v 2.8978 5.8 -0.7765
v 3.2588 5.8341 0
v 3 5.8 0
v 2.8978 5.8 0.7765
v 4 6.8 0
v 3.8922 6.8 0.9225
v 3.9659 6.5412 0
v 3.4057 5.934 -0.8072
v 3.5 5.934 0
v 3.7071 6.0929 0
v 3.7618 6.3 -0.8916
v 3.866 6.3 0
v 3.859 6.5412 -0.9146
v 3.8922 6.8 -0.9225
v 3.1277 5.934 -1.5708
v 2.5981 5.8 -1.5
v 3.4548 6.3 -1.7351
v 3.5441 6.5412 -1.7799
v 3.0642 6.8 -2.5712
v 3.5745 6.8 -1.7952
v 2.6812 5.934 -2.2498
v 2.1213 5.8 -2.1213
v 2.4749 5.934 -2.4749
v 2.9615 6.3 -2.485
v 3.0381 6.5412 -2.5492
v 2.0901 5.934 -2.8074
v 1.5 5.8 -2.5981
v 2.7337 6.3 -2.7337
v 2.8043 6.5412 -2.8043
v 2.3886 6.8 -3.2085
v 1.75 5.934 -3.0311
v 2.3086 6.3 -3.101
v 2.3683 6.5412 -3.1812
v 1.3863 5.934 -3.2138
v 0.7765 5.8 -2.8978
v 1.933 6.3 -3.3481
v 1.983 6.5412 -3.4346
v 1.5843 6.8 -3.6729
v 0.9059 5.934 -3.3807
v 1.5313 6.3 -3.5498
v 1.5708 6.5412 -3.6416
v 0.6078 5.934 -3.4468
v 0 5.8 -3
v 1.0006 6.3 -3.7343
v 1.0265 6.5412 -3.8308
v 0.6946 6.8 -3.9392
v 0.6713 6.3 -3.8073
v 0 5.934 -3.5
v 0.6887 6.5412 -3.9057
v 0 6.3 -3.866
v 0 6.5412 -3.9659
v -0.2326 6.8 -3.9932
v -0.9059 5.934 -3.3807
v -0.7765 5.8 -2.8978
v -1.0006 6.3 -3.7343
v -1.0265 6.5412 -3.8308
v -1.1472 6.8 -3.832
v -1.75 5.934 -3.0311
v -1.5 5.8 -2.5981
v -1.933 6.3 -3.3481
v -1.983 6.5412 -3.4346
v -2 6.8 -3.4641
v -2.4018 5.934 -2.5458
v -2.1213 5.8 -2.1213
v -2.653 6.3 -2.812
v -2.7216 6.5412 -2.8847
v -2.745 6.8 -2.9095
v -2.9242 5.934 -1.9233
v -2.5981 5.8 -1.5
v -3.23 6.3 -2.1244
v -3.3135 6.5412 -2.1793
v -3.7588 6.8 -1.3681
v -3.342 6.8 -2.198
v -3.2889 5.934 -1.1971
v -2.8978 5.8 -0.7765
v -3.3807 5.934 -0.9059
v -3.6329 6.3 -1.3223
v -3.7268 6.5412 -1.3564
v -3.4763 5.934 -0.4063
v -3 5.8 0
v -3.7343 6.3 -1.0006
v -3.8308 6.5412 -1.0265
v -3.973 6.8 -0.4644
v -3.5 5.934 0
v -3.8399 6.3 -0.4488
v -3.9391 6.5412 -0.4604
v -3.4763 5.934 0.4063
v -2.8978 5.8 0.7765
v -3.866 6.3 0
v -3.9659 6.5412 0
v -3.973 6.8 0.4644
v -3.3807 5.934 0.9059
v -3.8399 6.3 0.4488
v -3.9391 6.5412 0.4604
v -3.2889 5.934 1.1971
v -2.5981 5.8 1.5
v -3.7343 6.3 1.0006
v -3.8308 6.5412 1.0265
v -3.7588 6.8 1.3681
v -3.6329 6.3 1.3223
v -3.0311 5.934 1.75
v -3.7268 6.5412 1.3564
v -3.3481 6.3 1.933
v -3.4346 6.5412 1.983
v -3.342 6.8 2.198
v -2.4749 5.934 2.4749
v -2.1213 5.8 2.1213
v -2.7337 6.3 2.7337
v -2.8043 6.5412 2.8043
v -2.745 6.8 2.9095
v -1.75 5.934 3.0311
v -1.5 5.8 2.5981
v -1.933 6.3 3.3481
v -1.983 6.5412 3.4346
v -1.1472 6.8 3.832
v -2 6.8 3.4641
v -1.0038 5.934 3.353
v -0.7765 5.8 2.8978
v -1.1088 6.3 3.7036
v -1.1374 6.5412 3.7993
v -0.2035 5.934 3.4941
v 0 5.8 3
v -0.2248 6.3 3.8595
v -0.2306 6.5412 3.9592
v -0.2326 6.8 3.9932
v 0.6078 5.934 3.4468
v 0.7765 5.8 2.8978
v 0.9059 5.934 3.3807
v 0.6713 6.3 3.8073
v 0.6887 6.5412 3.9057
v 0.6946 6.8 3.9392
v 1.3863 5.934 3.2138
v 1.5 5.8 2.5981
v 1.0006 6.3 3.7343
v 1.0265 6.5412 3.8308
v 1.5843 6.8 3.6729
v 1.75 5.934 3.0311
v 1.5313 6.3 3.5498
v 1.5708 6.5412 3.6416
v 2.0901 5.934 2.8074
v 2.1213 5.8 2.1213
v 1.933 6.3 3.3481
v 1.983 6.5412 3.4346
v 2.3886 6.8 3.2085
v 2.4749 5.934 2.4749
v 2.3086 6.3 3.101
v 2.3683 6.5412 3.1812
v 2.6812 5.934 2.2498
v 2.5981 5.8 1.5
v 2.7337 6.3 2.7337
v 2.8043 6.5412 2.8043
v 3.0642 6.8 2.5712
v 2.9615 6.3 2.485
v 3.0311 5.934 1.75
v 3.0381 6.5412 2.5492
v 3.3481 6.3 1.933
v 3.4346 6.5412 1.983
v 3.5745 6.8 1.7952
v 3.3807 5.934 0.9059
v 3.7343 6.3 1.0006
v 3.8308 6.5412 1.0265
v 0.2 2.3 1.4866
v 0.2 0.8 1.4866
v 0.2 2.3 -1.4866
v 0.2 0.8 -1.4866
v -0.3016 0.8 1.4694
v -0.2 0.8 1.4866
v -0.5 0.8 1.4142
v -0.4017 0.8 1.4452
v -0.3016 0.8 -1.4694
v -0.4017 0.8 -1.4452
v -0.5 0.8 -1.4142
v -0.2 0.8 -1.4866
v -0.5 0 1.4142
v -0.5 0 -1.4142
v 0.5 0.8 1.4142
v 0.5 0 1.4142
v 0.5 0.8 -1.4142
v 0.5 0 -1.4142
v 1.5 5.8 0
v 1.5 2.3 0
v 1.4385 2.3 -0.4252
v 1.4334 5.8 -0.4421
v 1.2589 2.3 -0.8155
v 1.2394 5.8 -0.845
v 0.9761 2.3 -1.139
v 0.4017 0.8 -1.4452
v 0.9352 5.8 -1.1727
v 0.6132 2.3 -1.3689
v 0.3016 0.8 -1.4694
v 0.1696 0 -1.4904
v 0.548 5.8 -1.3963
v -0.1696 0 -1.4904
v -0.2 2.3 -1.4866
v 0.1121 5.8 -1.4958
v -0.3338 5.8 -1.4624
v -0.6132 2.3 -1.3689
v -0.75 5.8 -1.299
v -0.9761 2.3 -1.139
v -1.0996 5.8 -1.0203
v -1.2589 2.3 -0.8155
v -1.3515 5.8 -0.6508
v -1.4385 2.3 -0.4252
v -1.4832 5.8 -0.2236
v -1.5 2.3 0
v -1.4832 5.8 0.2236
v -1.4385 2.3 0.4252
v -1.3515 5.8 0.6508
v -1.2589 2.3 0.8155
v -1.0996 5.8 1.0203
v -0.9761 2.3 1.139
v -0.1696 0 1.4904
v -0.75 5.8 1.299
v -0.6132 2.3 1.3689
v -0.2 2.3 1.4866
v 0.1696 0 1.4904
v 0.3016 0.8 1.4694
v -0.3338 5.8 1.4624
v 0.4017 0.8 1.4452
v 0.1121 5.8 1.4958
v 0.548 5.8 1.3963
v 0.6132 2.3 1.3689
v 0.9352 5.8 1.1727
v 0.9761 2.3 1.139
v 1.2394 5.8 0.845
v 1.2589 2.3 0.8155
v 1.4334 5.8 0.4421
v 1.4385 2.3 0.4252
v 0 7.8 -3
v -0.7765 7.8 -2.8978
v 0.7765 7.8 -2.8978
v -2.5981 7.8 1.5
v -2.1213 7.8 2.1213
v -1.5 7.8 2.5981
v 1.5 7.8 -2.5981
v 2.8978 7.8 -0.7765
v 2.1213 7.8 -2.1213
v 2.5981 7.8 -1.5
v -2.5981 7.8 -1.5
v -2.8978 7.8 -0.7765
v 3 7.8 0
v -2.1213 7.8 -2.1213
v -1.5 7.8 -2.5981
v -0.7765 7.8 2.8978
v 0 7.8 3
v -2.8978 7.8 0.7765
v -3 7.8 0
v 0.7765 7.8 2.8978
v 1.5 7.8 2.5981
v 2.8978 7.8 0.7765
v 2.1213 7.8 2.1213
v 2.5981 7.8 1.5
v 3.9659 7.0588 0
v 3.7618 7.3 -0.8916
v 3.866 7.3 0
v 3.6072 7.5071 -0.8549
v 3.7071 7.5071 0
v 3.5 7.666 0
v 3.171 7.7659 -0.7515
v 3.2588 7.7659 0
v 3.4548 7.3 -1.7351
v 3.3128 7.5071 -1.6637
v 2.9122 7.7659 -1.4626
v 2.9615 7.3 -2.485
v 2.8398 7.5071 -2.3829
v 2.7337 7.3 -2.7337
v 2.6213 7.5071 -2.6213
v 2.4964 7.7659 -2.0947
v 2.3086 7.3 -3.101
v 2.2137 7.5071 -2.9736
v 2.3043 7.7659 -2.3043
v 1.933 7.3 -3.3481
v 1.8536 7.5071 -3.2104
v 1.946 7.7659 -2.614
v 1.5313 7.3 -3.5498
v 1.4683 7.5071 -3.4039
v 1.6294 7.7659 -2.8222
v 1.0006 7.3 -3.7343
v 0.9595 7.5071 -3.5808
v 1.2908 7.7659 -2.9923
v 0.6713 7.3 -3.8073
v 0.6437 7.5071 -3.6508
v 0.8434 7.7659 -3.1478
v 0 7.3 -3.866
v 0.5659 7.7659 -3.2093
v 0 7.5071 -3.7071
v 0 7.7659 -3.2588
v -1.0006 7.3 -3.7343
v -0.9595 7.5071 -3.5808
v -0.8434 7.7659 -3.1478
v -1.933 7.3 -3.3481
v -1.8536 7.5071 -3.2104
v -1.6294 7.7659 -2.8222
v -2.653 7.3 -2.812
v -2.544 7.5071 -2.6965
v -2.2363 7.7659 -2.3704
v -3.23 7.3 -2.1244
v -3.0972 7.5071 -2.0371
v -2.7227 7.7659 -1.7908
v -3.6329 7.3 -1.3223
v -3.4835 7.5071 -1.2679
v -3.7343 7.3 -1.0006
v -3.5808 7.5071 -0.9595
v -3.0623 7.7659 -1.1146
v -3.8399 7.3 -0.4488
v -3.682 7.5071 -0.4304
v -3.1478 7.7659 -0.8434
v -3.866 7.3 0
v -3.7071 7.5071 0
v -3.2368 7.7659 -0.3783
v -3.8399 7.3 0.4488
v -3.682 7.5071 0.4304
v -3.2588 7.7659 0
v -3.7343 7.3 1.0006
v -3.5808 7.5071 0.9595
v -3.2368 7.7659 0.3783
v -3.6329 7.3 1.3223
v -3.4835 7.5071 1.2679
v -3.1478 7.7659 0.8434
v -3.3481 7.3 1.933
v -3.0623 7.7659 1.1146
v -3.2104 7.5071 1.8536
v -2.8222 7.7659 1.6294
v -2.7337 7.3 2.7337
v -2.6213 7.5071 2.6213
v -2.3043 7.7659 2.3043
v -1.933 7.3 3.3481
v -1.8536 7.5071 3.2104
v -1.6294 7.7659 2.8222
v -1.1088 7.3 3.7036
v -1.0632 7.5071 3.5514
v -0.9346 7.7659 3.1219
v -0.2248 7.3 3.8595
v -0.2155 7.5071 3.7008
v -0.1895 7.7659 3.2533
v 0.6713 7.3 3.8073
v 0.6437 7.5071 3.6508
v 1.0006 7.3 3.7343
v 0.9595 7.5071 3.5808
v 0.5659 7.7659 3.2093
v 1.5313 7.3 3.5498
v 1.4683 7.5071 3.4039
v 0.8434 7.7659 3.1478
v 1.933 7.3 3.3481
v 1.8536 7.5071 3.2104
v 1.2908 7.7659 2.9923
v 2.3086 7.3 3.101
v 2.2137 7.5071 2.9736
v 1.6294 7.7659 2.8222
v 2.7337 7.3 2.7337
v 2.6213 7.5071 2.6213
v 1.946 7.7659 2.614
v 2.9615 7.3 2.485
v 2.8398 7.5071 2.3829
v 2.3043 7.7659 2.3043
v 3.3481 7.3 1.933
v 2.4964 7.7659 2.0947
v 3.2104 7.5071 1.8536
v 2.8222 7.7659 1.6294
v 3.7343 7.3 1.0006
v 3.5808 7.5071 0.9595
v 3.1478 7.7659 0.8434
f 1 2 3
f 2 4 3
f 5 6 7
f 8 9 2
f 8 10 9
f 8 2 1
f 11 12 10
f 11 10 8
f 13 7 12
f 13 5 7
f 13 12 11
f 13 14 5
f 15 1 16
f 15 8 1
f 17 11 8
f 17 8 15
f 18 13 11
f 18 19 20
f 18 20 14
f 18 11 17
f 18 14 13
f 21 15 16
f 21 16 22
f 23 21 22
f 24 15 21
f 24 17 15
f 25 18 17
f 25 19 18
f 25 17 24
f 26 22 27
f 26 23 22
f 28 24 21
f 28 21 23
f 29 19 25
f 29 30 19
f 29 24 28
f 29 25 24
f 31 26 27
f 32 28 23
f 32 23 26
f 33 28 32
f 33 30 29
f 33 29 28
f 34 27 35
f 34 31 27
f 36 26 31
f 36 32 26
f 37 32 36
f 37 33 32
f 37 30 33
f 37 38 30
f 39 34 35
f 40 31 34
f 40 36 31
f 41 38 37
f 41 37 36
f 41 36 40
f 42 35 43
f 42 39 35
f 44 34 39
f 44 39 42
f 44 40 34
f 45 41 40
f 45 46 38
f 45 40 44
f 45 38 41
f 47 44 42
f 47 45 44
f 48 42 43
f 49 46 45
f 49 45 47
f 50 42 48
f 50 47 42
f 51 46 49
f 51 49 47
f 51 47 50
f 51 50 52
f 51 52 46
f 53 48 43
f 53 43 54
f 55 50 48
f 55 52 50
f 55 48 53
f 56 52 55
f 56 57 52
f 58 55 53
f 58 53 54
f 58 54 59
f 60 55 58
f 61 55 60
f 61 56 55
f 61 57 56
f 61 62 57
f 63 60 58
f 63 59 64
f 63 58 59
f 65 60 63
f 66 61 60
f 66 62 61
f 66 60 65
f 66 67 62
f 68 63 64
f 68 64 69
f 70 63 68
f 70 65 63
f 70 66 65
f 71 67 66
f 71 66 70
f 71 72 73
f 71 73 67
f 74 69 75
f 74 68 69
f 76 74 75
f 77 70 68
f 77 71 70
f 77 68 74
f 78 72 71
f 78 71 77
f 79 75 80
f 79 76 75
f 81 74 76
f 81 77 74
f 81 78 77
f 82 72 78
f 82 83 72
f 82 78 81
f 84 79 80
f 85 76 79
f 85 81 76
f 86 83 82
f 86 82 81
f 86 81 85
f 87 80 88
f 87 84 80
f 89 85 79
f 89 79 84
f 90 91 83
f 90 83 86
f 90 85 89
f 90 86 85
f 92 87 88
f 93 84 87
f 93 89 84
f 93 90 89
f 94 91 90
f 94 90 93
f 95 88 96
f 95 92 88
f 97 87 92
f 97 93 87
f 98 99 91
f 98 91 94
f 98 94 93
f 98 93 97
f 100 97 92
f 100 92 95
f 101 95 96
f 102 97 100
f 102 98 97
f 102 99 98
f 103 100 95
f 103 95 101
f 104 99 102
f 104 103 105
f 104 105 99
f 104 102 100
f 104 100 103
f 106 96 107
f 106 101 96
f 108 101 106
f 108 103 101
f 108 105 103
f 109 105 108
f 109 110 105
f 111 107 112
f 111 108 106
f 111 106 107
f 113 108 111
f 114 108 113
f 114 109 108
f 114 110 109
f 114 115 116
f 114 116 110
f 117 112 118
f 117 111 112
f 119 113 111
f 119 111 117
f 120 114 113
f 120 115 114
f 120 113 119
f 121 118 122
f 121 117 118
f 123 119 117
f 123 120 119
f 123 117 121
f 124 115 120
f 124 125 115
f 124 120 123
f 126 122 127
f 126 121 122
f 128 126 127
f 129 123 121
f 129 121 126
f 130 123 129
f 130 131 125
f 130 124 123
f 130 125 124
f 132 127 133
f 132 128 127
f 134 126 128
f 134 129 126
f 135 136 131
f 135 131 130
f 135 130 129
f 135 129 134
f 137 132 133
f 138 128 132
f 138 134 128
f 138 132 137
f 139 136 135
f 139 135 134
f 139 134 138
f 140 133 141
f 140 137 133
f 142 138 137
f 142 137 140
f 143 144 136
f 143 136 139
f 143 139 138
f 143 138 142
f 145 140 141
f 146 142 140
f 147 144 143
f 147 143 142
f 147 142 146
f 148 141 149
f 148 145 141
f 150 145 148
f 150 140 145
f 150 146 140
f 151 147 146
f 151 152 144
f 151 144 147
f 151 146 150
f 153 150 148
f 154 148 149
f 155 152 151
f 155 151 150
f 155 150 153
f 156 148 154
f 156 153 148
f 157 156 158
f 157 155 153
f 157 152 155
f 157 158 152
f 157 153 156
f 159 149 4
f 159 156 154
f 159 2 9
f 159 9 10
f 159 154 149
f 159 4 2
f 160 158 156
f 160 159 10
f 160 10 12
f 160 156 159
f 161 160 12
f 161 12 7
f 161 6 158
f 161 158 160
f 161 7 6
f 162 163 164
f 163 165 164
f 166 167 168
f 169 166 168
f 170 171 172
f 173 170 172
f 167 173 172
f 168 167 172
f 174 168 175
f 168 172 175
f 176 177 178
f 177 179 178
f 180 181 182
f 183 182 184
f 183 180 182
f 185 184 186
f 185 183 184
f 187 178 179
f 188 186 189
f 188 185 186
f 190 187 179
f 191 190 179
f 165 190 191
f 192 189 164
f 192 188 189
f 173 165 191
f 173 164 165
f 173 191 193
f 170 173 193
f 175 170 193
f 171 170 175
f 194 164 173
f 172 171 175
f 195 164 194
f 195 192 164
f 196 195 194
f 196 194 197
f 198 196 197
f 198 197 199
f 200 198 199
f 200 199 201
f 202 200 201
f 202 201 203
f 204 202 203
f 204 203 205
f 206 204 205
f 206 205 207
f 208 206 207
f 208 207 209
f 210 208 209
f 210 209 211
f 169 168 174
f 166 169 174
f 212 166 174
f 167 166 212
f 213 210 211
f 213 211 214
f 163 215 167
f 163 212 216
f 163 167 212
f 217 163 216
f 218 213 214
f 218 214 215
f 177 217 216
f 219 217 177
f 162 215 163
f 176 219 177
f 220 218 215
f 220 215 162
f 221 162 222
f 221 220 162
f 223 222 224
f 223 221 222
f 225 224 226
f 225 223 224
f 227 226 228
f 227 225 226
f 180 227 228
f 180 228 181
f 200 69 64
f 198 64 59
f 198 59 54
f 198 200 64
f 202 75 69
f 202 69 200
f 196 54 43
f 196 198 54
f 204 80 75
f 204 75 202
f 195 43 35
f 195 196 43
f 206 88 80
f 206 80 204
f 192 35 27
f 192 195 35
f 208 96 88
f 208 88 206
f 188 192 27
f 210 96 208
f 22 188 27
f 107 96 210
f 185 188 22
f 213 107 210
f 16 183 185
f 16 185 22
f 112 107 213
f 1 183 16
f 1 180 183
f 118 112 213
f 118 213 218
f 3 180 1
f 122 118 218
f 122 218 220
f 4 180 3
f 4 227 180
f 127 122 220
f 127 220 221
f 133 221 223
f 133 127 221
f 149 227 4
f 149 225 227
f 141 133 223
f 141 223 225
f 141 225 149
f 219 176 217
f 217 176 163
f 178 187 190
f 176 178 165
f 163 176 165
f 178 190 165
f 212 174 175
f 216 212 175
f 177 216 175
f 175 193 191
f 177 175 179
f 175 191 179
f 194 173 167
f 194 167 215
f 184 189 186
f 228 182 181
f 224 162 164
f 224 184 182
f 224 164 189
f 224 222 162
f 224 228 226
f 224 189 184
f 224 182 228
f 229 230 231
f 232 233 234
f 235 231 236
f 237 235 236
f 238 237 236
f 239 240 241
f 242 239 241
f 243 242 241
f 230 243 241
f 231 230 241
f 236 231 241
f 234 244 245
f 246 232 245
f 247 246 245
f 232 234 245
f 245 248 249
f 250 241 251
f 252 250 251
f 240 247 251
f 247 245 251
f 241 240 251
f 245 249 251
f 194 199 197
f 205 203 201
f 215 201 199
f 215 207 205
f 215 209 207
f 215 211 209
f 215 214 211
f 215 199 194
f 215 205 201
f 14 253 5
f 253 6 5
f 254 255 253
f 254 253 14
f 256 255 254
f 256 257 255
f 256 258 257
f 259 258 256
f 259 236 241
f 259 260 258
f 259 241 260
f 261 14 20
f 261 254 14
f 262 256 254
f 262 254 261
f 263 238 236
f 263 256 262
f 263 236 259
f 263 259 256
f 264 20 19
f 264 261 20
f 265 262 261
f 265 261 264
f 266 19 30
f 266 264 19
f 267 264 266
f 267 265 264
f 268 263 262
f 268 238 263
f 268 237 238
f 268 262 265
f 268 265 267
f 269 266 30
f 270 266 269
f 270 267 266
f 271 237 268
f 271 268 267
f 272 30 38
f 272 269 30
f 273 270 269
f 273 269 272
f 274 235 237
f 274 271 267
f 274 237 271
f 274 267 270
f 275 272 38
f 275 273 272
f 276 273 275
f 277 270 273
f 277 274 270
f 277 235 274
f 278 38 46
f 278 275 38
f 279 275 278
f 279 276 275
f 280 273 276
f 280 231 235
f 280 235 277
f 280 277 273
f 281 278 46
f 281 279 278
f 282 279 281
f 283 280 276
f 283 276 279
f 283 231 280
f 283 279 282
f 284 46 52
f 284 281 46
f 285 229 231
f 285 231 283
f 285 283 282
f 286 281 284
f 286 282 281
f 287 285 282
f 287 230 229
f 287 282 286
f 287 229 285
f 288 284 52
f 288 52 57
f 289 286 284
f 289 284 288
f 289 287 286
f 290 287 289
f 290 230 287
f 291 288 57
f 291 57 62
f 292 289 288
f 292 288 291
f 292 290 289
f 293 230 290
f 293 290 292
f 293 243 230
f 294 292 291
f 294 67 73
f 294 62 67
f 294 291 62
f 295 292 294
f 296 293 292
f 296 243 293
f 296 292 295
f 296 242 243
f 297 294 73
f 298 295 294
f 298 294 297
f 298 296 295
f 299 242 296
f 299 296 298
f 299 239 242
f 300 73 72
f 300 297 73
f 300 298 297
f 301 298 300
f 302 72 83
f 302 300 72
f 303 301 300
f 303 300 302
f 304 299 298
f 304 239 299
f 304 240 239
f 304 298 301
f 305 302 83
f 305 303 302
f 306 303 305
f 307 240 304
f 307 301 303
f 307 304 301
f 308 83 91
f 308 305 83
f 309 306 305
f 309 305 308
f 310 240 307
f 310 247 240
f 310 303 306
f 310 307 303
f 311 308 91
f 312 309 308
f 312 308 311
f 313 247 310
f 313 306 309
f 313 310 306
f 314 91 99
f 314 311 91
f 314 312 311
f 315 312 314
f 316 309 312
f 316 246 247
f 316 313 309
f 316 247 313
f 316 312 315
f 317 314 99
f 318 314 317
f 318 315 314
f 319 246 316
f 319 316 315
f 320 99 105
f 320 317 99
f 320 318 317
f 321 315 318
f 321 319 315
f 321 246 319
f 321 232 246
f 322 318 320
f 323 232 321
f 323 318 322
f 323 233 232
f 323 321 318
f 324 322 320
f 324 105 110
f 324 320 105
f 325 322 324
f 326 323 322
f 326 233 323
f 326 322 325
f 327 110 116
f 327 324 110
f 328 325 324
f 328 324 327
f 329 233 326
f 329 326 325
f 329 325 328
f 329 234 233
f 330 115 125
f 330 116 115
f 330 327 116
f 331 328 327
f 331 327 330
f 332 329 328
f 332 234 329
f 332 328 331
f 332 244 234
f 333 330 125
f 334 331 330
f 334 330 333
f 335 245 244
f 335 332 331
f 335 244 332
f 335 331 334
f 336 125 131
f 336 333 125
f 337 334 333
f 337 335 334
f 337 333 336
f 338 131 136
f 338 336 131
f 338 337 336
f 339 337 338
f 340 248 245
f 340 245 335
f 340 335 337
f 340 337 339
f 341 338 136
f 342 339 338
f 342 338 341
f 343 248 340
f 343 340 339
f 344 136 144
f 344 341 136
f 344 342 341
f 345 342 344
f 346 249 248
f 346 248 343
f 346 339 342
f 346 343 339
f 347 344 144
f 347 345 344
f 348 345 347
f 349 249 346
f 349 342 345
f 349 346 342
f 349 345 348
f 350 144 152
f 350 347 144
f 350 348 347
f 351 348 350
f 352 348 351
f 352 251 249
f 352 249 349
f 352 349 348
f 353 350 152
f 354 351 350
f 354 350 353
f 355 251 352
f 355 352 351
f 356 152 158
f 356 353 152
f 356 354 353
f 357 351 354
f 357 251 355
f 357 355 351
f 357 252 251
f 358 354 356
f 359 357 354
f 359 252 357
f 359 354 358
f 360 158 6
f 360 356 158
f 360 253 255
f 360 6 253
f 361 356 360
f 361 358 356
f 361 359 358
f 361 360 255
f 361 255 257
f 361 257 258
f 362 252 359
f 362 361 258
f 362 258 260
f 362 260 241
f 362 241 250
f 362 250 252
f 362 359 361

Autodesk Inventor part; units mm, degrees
ref_plane "YZ Plane" through (0, 0, 0) normal (1, 0, 0) x (0, 1, 0)
ref_plane "XZ Plane" through (0, 0, 0) normal (0, 1, 0) x (-1, 0, 0)
ref_plane "XY Plane" through (0, 0, 0) normal (0, 0, 1) x (1, 0, 0)
sketch "Sketch1" plane through (0, 0, 0) normal (0, 0, 1) x (1, 0, 0)
  line L0 (-0.2, 0.9842) -> (-0.2, 0.8)
  line L1 (-0.2, 0.8) -> (-0.5, 0.8)
  line L2 (-0.5, 0.8) -> (-0.5, 0)
  line L3 (-0.5, 0) -> (0.5, 0)
  line L4 (0.5, 0) -> (0.5, 0.8)
  line L5 (0.5, 0.8) -> (0.2, 0.8)
  line L6 (0.2, 0.8) -> (0.2, 0.9842)
  line L7 (0.2, 0.9842) -> (0.2, 2.3)
  line L8 (0.2, 2.3) -> (1.5, 2.3)
  line L9 (1.5, 2.3) -> (1.5, 5.8)
  line L10 (1.5, 5.8) -> (-1.5, 5.8)
  line L11 (-1.5, 5.8) -> (-1.5, 2.3)
  line L12 (-1.5, 2.3) -> (-0.2, 2.3)
  line L13 (-0.2, 0.9842) -> (-0.2, 2.3)
  line L14 (0, 5.8) -> (0, 0) construction
  line L15 (-0.2, 2.3) -> (0.2, 2.3)
  line L16 (0, 5.8) -> (0, 2.3)
  line L17 (0, 5.8) -> (3, 5.8)
  line L18 (4, 6.8) -> (4, 6.8)
  line L19 (3, 7.8) -> (0, 7.8)
  line L20 (0, 7.8) -> (0, 5.8)
  arc A0 (4, 6.8) -> (3, 7.8) centre (3, 6.8) ccw
  arc A1 (3, 5.8) -> (4, 6.8) centre (3, 6.8) ccw
  point P0 (4, 7.8)
  point P1 (4, 5.8)
  point P2 (4, 6.8)
  dimension "d0" = 0.4
  dimension "d1" = 3
  dimension "d2" = 1
  dimension "d3" = 0.8
  dimension "d4" = 1.5
  dimension "d5" = 3.5
  dimension "d12" = 2
  dimension "d13" = 1
  dimension "d14" = 1
  dimension "d15" = 3
extrude "Extrusion1" add sketch "Sketch1" along normal mid plane 3 contours L13 L15 L7 L6 L5 L4 L3 L2 L1 L0
revolve "Revolution1" add sketch "Sketch1" angle 360 about axis through (0, 5.8, 0) along (0, -1, 0) contours L16 L10 L9 L8 L15
sketch "Sketch2" plane through (-0.5, 0, 1.5) normal (0, -1, 0) x (1, 0, 0)
  circle A0 centre (0.5, -1.5) radius 1.5
  arc A1 (0.3, -0.0134) -> (0.3, -2.9866) centre (0.5, -1.5) ccw projected
  line L0 (0, -0.0858) -> (0, 0)
  line L1 (0, 0) -> (0.5, 0)
  line L2 (0, 0) -> (1, 0) projected
  line L3 (1, 0) -> (0.7, 0) projected
  line L4 (0.5, 0) -> (1, 0)
  line L5 (1, 0) -> (1, -0.0858)
  line L6 (0, -3) -> (0, 0) projected
  line L7 (0, -2.9142) -> (0, -3)
  line L8 (0.3, -3) -> (0.5, -3) projected
  line L9 (0, -3) -> (0.5, -3)
  line L10 (1, -3) -> (1, 0) projected
  line L11 (0.5, -3) -> (1, -3)
  line L12 (1, -3) -> (1, -2.9142)
  dimension "d9" = 3
extrude "Extrusion2" cut sketch "Sketch2" against normal up to surface (2.3 mm away) contours A0 L2 L5 | L10 L11 A0 | A0 L0 L1 | L8 L9 L6 A0
revolve "Revolution2" add sketch "Sketch1" angle 360 about axis through (0, 7.8, 0) along (0, -1, 0) contours L20 L19 A0 A1 L17 L10
properties part number "Taster_Top"
